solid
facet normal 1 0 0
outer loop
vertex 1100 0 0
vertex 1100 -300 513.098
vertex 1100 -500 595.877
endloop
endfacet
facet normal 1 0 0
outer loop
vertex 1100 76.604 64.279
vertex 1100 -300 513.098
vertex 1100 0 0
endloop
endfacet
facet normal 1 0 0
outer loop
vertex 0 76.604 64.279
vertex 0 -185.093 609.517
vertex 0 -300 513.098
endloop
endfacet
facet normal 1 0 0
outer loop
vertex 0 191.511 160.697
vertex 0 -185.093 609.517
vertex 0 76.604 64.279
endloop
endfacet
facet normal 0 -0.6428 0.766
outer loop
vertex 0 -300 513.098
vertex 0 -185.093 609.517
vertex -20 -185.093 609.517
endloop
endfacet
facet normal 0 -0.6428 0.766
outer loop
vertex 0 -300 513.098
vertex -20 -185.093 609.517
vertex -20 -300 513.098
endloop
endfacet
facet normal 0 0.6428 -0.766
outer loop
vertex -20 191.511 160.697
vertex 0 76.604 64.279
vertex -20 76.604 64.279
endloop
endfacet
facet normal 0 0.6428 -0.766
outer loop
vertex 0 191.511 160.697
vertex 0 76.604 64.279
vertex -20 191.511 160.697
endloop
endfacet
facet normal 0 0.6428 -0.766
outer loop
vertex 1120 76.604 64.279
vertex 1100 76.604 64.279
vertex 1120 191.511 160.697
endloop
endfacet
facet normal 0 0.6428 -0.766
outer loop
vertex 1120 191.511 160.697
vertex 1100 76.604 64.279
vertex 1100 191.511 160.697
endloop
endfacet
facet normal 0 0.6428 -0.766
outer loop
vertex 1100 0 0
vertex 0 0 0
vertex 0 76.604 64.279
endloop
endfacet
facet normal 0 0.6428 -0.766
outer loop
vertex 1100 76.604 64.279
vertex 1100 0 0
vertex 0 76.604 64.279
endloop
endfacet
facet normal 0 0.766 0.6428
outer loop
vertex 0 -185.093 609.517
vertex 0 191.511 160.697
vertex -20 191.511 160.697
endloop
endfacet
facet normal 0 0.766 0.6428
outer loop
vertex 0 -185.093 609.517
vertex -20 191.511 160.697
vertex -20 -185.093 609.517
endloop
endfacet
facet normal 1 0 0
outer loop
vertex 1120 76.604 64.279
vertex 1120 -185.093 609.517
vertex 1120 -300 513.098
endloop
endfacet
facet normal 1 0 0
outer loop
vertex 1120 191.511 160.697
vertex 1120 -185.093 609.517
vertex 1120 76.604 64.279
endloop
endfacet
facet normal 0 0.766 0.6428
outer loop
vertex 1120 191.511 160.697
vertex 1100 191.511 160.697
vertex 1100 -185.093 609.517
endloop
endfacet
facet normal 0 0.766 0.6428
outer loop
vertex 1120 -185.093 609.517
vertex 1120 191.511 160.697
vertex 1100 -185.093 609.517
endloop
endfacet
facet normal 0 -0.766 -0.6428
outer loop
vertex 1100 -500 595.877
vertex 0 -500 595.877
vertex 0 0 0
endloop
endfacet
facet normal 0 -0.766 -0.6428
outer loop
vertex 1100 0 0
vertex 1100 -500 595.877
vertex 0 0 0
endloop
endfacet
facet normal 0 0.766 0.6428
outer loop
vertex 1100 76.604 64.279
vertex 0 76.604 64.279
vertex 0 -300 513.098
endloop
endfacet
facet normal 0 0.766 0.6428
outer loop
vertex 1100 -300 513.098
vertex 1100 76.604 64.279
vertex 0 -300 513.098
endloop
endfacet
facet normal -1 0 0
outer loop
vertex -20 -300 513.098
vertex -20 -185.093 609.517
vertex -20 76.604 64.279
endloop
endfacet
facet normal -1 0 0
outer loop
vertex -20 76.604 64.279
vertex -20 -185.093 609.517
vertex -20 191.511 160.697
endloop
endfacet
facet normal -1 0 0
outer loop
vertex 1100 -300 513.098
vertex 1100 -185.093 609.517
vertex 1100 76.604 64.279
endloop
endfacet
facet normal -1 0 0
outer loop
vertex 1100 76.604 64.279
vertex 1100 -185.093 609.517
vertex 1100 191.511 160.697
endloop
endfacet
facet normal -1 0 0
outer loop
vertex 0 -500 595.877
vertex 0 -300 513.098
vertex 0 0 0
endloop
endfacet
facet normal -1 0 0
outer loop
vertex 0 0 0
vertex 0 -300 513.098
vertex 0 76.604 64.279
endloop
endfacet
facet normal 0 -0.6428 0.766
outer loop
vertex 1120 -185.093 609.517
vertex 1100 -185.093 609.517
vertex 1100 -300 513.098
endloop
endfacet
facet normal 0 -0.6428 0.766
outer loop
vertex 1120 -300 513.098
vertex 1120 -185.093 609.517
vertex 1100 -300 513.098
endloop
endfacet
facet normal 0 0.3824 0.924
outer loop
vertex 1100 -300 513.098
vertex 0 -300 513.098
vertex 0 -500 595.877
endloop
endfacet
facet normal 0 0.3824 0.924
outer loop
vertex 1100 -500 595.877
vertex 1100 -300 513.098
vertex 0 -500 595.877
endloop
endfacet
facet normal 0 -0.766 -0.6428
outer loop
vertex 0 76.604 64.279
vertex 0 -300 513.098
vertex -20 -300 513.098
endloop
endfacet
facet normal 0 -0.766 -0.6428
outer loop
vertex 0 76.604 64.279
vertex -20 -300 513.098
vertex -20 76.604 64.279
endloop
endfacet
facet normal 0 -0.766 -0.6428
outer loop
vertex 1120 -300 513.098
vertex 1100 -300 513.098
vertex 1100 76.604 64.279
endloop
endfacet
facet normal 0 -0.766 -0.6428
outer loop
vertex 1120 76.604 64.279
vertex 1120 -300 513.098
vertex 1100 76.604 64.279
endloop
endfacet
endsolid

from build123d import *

# Parameters (mm, degrees)
BOSS_EXTRUDE2_DEPTH = 1100
BOSS_EXTRUDE3_DEPTH = 20
BOSS_EXTRUDE4_DEPTH = 20


with BuildPart() as part:
    # Sketch1 → Boss-Extrude2 (new body)
    with BuildSketch(Plane(origin=(0, 0, 0), x_dir=(0, 0, -1), z_dir=(1, 0, 0))):
        Polygon((-357.526077778, -300), (0, 0), (-64.278760969, 76.604444312), (-513.098460464, -300), (-595.876796297, -500), align=None)
    extrude(amount=BOSS_EXTRUDE2_DEPTH)


with BuildPart() as body_2:
    # Sketch2 → Boss-Extrude3 (new body)
    with BuildSketch(Plane(origin=(1100, 0, 0), x_dir=(0, 0, -1), z_dir=(1, 0, 0))):
        Polygon((-609.516601917, -185.093333532), (-513.098460464, -300), (-64.278760969, 76.604444312), (-160.696902422, 191.51111078), align=None)
    extrude(amount=BOSS_EXTRUDE3_DEPTH)


with BuildPart() as body_3:
    # Sketch3 → Boss-Extrude4 (new body)
    with BuildSketch(Plane.ZY):
        Polygon((64.278760969, 76.604444312), (160.696902422, 191.51111078), (609.516601917, -185.093333532), (513.098460464, -300), align=None)
    extrude(amount=BOSS_EXTRUDE4_DEPTH)


solid = Compound([part.part, body_2.part, body_3.part])
